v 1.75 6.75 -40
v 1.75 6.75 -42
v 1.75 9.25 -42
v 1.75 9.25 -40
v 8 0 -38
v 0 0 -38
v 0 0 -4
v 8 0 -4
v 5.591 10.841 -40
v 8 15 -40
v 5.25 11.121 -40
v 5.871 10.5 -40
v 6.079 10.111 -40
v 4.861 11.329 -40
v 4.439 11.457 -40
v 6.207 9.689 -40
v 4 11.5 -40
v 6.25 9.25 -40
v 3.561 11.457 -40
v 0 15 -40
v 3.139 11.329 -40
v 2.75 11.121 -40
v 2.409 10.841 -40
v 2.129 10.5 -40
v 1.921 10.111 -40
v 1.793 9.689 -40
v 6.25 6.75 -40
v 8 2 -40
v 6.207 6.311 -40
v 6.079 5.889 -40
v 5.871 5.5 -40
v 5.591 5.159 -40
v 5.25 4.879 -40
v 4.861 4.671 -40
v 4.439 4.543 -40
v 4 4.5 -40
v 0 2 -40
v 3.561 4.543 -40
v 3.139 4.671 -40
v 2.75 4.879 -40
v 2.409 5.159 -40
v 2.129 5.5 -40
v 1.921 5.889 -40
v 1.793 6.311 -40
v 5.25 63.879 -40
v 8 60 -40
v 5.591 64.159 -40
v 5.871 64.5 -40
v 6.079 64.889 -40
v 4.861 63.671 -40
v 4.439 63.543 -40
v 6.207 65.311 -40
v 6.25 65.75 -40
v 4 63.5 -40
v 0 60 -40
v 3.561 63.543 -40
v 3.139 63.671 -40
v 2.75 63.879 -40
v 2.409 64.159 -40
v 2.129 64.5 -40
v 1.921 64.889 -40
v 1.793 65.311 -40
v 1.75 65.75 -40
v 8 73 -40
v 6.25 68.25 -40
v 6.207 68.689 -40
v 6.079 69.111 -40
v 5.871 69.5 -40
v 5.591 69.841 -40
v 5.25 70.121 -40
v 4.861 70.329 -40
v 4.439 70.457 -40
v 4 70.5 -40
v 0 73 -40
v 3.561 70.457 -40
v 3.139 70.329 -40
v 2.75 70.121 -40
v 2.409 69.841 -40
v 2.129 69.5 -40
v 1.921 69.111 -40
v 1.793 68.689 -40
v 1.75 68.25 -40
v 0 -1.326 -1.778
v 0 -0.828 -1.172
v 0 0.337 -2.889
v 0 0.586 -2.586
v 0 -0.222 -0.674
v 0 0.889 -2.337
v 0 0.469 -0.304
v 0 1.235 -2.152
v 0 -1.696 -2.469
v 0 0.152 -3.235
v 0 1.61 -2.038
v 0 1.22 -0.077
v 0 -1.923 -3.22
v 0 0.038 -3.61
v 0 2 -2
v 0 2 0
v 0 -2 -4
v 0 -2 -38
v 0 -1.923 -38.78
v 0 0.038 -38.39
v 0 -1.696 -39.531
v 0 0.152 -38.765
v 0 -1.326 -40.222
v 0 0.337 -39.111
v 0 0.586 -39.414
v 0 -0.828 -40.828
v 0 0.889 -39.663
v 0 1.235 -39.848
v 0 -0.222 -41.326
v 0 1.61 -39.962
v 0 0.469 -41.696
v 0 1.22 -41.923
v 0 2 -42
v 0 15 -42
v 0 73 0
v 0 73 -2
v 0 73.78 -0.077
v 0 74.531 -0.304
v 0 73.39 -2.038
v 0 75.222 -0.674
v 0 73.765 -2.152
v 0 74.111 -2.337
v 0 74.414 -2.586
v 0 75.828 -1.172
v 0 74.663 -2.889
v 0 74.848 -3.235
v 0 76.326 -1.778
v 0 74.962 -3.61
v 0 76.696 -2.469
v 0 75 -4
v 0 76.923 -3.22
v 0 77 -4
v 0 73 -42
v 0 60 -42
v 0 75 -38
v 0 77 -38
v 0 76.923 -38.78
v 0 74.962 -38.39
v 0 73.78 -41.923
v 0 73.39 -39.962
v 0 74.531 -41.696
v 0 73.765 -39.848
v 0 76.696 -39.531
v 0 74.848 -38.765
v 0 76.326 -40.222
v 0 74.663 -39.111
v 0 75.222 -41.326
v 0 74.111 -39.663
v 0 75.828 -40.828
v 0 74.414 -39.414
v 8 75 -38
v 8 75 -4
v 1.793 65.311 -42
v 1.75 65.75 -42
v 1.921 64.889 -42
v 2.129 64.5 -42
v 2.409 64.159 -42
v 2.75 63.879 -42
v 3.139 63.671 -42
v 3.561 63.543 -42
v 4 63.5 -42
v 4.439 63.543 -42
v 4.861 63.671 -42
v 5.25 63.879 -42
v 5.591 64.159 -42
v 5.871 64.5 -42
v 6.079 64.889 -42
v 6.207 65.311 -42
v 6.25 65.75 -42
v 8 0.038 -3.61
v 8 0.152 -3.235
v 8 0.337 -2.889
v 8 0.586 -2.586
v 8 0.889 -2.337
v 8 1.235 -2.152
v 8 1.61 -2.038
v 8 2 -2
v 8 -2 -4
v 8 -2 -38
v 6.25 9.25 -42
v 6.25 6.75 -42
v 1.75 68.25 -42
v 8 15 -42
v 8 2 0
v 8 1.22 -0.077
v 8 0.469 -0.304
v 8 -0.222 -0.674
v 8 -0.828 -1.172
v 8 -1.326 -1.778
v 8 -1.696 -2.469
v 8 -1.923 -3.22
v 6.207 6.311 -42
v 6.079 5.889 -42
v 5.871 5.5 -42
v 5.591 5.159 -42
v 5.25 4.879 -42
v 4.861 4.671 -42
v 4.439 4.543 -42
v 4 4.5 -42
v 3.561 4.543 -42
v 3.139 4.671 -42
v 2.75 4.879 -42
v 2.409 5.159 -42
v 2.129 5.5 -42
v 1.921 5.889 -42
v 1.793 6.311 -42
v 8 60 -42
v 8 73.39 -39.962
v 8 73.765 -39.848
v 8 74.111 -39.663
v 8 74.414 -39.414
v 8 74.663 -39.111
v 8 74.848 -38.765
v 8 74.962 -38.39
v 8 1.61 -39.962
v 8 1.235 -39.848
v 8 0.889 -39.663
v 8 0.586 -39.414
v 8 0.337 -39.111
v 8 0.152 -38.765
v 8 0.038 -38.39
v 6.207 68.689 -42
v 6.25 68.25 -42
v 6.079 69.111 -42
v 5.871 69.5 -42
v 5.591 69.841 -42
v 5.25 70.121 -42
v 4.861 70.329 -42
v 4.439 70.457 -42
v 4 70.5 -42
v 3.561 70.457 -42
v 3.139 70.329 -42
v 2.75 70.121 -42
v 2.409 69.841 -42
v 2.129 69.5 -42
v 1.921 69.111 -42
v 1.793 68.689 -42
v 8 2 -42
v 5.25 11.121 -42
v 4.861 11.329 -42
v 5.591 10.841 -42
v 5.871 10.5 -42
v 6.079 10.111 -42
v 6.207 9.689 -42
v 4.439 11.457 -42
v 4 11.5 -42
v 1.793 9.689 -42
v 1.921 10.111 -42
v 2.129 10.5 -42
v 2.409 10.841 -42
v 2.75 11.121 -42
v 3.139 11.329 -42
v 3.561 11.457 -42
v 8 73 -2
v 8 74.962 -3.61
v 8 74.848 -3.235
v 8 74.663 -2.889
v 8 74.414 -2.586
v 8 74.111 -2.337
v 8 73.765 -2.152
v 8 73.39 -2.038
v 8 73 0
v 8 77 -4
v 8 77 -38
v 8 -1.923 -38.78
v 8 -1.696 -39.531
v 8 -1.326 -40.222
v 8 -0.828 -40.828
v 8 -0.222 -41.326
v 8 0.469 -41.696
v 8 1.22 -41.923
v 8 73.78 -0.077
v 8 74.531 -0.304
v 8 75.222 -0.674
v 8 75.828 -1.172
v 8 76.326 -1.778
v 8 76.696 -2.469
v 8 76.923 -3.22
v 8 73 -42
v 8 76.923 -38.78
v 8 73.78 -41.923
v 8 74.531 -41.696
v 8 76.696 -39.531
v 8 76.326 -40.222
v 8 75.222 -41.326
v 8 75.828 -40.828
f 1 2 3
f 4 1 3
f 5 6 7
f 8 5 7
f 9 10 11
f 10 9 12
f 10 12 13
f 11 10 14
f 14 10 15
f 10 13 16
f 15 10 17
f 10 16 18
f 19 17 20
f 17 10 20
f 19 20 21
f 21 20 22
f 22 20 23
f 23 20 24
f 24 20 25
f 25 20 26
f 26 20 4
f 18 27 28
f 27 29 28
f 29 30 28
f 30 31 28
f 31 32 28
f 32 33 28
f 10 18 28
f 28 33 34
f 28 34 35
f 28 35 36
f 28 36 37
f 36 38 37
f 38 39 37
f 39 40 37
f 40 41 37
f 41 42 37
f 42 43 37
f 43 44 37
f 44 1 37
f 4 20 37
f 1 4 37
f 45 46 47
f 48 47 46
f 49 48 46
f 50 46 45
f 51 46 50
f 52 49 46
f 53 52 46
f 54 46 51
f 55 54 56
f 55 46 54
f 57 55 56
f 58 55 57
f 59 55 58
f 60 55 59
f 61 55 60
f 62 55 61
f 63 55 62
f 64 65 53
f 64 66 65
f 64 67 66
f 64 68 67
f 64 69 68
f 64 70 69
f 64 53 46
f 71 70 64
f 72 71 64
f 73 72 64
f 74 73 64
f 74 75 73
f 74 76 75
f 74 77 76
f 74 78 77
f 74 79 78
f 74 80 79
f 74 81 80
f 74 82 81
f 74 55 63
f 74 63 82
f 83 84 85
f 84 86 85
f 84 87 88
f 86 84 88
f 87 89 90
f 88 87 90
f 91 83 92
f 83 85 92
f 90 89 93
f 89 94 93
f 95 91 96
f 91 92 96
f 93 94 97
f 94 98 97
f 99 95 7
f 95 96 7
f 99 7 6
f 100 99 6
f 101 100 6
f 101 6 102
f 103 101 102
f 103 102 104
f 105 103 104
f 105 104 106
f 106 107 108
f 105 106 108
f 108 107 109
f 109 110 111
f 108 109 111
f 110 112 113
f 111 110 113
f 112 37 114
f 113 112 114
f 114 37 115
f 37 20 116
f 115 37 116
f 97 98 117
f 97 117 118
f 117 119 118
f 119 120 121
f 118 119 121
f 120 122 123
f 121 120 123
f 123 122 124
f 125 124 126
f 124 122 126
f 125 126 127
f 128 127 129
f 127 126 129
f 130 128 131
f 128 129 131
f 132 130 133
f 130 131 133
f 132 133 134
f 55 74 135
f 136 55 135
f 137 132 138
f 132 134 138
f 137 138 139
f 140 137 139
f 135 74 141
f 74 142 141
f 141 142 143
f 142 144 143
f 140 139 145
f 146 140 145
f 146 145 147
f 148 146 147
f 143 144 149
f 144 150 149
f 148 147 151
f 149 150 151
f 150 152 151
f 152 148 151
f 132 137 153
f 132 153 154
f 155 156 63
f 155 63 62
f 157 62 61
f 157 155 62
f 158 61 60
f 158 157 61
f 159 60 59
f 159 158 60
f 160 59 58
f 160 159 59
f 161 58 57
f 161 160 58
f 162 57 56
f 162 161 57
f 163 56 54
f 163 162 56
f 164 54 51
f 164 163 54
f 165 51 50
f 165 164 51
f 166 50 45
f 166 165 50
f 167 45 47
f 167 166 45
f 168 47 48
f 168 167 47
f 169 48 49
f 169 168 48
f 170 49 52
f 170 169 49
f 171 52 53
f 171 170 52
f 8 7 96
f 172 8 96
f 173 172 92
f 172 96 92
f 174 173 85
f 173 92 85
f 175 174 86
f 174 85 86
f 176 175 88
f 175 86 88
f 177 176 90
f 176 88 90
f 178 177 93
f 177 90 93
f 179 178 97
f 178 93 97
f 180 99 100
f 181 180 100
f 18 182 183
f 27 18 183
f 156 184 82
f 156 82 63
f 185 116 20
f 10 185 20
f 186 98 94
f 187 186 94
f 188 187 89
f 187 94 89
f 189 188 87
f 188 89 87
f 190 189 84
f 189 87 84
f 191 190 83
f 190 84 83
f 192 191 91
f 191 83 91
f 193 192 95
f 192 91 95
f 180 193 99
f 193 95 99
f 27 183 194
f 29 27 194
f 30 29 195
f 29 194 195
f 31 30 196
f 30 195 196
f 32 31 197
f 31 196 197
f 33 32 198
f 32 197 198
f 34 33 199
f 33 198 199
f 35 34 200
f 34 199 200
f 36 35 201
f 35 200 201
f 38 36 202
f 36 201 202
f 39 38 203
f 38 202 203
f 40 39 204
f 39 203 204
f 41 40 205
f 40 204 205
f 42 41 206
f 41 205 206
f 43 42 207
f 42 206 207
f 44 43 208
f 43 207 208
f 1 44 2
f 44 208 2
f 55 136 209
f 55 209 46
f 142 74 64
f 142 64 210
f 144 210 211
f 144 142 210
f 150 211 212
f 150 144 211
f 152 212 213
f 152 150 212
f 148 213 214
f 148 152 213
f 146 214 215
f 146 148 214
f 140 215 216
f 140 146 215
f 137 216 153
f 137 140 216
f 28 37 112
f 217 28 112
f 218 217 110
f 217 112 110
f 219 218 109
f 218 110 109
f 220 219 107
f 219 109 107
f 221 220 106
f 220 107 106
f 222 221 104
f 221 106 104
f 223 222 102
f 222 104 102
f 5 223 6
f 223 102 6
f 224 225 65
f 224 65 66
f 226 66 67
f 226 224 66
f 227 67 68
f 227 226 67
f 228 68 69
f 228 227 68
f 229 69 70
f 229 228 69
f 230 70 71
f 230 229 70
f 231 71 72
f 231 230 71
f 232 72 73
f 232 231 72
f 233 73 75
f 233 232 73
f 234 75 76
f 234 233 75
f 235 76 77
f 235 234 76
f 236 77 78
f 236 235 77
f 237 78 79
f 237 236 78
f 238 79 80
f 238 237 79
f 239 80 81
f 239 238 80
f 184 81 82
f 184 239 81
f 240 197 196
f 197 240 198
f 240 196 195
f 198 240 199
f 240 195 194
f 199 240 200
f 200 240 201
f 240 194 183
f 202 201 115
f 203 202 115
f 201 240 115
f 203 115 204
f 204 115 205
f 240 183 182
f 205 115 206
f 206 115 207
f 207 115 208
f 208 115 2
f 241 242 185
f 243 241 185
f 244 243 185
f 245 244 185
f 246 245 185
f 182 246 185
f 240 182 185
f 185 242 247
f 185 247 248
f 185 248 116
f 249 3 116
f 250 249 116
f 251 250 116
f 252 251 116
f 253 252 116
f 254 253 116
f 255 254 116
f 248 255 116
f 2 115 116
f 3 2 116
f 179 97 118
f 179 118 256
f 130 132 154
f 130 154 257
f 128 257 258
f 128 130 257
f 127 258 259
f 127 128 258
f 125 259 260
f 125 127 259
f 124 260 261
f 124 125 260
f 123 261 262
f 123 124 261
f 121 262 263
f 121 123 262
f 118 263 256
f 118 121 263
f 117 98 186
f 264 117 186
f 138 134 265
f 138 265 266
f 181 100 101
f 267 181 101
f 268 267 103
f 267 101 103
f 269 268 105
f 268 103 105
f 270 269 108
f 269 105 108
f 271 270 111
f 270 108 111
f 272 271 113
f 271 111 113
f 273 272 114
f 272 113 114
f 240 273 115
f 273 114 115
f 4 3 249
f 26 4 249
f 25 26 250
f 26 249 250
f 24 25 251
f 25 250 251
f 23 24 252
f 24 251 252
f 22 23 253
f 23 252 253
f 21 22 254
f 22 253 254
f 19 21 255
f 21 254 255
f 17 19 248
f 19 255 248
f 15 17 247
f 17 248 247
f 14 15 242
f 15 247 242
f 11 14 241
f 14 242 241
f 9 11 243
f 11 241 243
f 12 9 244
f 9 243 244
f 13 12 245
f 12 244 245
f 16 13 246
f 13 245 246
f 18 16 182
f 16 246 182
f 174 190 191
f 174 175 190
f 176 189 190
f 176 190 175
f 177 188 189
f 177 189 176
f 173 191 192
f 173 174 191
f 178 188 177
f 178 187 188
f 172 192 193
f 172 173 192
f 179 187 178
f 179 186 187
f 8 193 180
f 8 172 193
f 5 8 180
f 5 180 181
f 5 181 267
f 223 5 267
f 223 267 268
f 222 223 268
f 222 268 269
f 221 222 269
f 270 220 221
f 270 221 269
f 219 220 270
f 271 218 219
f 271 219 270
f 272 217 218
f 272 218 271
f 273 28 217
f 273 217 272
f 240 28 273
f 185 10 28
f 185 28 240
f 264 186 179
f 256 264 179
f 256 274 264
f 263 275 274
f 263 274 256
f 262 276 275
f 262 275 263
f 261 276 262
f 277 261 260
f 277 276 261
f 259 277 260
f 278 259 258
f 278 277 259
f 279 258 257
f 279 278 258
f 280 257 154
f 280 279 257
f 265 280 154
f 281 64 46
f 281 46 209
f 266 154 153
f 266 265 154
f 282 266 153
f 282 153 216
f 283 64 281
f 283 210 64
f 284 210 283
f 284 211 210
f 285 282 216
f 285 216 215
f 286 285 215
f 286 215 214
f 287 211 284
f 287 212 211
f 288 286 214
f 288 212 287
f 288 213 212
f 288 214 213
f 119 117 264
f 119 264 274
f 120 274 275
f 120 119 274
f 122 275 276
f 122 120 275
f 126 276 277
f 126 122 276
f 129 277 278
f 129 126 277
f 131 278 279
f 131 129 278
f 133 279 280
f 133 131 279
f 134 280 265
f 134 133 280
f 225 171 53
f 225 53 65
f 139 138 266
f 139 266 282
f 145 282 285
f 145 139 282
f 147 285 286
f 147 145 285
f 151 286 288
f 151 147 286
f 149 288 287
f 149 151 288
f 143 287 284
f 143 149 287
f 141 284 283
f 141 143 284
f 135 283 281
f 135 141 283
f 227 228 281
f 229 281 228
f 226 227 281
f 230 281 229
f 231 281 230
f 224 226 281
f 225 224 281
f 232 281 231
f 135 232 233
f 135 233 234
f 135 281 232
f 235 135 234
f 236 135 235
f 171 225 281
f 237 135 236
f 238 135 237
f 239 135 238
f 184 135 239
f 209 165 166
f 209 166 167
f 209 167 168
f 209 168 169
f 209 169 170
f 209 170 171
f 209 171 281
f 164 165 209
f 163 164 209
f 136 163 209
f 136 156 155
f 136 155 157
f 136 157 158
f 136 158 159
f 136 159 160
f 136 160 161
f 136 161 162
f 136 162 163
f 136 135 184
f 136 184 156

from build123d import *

# Parameters (mm, degrees)
SKIZZE1_W                       = 8
SKIZZE1_H                       = 75
BASIS_BLECH1_DEPTH              = 2
KANTE_LASCHE3_STRIP_W           = 12
KANTE_LASCHE3_STRIP_H           = 2
KANTE_LASCHE3_STRIP_CUT_DEPTH   = 8
KANTE_LASCHE3_DEPTH             = 8
KANTE_LASCHE4_STRIP_W           = 12
KANTE_LASCHE4_STRIP_H           = 2
KANTE_LASCHE4_STRIP_CUT_DEPTH   = 8
KANTE_LASCHE4_DEPTH             = 8
SCHNITT_LINEAR_AUSTRAGEN1_DEPTH = 2


# Sheet-metal steps are written as plain solids
with BuildPart() as part:
    # Skizze1 → Basis-Blech1 (new body)
    with BuildSketch(Plane.XY):
        with Locations((4, 37.5)):
            Rectangle(SKIZZE1_W, SKIZZE1_H)
    extrude(amount=-BASIS_BLECH1_DEPTH)

    # Kante-Lasche3 strip (across the edge) → Kante-Lasche3 strip cut (cut)
    with BuildSketch(Plane(origin=(0, 75, -2), x_dir=(0, -1, 0), z_dir=(1, 0, 0))):
        with Locations((-4, -1)):
            Rectangle(KANTE_LASCHE3_STRIP_W, KANTE_LASCHE3_STRIP_H)
    kante_lasche3_strip_cut = extrude(amount=KANTE_LASCHE3_STRIP_CUT_DEPTH, mode=Mode.SUBTRACT)

    # Kante-Lasche3 section (across the edge) → Kante-Lasche3 (add)
    with BuildSketch(Plane(origin=(0, 75, -2), x_dir=(0, -1, 0), z_dir=(1, 0, 0))):
        with BuildLine():
            Line((-2, 2), (-2, 38))
            Line((-2, 38), (0, 38))
            Line((0, 38), (0, 2))
            ThreePointArc((0, 2), (0.585786438, 0.585786438), (2, 0))
            Line((2, 0), (2, -2))
            ThreePointArc((2, -2), (-0.828427125, -0.828427125), (-2, 2))
        make_face()
    kante_lasche3 = extrude(amount=KANTE_LASCHE3_DEPTH)

    # Kante-Lasche4 strip (across the edge) → Kante-Lasche4 strip cut (cut)
    with BuildSketch(Plane(origin=(0, 75, -40), x_dir=(0, 0, 1), z_dir=(1, 0, 0))):
        with Locations((-4, -1)):
            Rectangle(KANTE_LASCHE4_STRIP_W, KANTE_LASCHE4_STRIP_H)
    kante_lasche4_strip_cut = extrude(amount=KANTE_LASCHE4_STRIP_CUT_DEPTH, mode=Mode.SUBTRACT)

    # Kante-Lasche4 section (across the edge) → Kante-Lasche4 (add)
    with BuildSketch(Plane(origin=(0, 75, -40), x_dir=(0, 0, 1), z_dir=(1, 0, 0))):
        with BuildLine():
            Line((-2, 2), (-2, 15))
            Line((-2, 15), (0, 15))
            Line((0, 15), (0, 2))
            ThreePointArc((0, 2), (0.585786438, 0.585786438), (2, 0))
            Line((2, 0), (2, -2))
            ThreePointArc((2, -2), (-0.828427125, -0.828427125), (-2, 2))
        make_face()
    kante_lasche4 = extrude(amount=KANTE_LASCHE4_DEPTH)

    # Skizze23 → Schnitt-Linear austragen1 (cut)
    with BuildSketch(Plane(origin=(0, 0, -42), x_dir=(-1, 0, 0), z_dir=(0, 0, -1))):
        with BuildLine():
            Line((-6.25, 65.75), (-6.25, 68.25))
            ThreePointArc((-6.25, 68.25), (-4, 70.5), (-1.75, 68.25))
            Line((-1.75, 68.25), (-1.75, 65.75))
            ThreePointArc((-1.75, 65.75), (-4, 63.5), (-6.25, 65.75))
        make_face()
    schnitt_linear_austragen1 = extrude(amount=-SCHNITT_LINEAR_AUSTRAGEN1_DEPTH, mode=Mode.SUBTRACT)

    # Spiegeln1: Kante-Lasche3 strip cut, Kante-Lasche3, Kante-Lasche4 strip cut, Kante-Lasche4, Schnitt-Linear austragen1 across plane
    add(kante_lasche3_strip_cut.mirror(Plane(origin=(0, 37.5, 0), x_dir=(0, 0, 1), z_dir=(0, -1, 0))), mode=Mode.SUBTRACT)
    add(kante_lasche3.mirror(Plane(origin=(0, 37.5, 0), x_dir=(0, 0, 1), z_dir=(0, -1, 0))))
    add(kante_lasche4_strip_cut.mirror(Plane(origin=(0, 37.5, 0), x_dir=(0, 0, 1), z_dir=(0, -1, 0))), mode=Mode.SUBTRACT)
    add(kante_lasche4.mirror(Plane(origin=(0, 37.5, 0), x_dir=(0, 0, 1), z_dir=(0, -1, 0))))
    add(schnitt_linear_austragen1.mirror(Plane(origin=(0, 37.5, 0), x_dir=(0, 0, 1), z_dir=(0, -1, 0))), mode=Mode.SUBTRACT)


solid = part.part
